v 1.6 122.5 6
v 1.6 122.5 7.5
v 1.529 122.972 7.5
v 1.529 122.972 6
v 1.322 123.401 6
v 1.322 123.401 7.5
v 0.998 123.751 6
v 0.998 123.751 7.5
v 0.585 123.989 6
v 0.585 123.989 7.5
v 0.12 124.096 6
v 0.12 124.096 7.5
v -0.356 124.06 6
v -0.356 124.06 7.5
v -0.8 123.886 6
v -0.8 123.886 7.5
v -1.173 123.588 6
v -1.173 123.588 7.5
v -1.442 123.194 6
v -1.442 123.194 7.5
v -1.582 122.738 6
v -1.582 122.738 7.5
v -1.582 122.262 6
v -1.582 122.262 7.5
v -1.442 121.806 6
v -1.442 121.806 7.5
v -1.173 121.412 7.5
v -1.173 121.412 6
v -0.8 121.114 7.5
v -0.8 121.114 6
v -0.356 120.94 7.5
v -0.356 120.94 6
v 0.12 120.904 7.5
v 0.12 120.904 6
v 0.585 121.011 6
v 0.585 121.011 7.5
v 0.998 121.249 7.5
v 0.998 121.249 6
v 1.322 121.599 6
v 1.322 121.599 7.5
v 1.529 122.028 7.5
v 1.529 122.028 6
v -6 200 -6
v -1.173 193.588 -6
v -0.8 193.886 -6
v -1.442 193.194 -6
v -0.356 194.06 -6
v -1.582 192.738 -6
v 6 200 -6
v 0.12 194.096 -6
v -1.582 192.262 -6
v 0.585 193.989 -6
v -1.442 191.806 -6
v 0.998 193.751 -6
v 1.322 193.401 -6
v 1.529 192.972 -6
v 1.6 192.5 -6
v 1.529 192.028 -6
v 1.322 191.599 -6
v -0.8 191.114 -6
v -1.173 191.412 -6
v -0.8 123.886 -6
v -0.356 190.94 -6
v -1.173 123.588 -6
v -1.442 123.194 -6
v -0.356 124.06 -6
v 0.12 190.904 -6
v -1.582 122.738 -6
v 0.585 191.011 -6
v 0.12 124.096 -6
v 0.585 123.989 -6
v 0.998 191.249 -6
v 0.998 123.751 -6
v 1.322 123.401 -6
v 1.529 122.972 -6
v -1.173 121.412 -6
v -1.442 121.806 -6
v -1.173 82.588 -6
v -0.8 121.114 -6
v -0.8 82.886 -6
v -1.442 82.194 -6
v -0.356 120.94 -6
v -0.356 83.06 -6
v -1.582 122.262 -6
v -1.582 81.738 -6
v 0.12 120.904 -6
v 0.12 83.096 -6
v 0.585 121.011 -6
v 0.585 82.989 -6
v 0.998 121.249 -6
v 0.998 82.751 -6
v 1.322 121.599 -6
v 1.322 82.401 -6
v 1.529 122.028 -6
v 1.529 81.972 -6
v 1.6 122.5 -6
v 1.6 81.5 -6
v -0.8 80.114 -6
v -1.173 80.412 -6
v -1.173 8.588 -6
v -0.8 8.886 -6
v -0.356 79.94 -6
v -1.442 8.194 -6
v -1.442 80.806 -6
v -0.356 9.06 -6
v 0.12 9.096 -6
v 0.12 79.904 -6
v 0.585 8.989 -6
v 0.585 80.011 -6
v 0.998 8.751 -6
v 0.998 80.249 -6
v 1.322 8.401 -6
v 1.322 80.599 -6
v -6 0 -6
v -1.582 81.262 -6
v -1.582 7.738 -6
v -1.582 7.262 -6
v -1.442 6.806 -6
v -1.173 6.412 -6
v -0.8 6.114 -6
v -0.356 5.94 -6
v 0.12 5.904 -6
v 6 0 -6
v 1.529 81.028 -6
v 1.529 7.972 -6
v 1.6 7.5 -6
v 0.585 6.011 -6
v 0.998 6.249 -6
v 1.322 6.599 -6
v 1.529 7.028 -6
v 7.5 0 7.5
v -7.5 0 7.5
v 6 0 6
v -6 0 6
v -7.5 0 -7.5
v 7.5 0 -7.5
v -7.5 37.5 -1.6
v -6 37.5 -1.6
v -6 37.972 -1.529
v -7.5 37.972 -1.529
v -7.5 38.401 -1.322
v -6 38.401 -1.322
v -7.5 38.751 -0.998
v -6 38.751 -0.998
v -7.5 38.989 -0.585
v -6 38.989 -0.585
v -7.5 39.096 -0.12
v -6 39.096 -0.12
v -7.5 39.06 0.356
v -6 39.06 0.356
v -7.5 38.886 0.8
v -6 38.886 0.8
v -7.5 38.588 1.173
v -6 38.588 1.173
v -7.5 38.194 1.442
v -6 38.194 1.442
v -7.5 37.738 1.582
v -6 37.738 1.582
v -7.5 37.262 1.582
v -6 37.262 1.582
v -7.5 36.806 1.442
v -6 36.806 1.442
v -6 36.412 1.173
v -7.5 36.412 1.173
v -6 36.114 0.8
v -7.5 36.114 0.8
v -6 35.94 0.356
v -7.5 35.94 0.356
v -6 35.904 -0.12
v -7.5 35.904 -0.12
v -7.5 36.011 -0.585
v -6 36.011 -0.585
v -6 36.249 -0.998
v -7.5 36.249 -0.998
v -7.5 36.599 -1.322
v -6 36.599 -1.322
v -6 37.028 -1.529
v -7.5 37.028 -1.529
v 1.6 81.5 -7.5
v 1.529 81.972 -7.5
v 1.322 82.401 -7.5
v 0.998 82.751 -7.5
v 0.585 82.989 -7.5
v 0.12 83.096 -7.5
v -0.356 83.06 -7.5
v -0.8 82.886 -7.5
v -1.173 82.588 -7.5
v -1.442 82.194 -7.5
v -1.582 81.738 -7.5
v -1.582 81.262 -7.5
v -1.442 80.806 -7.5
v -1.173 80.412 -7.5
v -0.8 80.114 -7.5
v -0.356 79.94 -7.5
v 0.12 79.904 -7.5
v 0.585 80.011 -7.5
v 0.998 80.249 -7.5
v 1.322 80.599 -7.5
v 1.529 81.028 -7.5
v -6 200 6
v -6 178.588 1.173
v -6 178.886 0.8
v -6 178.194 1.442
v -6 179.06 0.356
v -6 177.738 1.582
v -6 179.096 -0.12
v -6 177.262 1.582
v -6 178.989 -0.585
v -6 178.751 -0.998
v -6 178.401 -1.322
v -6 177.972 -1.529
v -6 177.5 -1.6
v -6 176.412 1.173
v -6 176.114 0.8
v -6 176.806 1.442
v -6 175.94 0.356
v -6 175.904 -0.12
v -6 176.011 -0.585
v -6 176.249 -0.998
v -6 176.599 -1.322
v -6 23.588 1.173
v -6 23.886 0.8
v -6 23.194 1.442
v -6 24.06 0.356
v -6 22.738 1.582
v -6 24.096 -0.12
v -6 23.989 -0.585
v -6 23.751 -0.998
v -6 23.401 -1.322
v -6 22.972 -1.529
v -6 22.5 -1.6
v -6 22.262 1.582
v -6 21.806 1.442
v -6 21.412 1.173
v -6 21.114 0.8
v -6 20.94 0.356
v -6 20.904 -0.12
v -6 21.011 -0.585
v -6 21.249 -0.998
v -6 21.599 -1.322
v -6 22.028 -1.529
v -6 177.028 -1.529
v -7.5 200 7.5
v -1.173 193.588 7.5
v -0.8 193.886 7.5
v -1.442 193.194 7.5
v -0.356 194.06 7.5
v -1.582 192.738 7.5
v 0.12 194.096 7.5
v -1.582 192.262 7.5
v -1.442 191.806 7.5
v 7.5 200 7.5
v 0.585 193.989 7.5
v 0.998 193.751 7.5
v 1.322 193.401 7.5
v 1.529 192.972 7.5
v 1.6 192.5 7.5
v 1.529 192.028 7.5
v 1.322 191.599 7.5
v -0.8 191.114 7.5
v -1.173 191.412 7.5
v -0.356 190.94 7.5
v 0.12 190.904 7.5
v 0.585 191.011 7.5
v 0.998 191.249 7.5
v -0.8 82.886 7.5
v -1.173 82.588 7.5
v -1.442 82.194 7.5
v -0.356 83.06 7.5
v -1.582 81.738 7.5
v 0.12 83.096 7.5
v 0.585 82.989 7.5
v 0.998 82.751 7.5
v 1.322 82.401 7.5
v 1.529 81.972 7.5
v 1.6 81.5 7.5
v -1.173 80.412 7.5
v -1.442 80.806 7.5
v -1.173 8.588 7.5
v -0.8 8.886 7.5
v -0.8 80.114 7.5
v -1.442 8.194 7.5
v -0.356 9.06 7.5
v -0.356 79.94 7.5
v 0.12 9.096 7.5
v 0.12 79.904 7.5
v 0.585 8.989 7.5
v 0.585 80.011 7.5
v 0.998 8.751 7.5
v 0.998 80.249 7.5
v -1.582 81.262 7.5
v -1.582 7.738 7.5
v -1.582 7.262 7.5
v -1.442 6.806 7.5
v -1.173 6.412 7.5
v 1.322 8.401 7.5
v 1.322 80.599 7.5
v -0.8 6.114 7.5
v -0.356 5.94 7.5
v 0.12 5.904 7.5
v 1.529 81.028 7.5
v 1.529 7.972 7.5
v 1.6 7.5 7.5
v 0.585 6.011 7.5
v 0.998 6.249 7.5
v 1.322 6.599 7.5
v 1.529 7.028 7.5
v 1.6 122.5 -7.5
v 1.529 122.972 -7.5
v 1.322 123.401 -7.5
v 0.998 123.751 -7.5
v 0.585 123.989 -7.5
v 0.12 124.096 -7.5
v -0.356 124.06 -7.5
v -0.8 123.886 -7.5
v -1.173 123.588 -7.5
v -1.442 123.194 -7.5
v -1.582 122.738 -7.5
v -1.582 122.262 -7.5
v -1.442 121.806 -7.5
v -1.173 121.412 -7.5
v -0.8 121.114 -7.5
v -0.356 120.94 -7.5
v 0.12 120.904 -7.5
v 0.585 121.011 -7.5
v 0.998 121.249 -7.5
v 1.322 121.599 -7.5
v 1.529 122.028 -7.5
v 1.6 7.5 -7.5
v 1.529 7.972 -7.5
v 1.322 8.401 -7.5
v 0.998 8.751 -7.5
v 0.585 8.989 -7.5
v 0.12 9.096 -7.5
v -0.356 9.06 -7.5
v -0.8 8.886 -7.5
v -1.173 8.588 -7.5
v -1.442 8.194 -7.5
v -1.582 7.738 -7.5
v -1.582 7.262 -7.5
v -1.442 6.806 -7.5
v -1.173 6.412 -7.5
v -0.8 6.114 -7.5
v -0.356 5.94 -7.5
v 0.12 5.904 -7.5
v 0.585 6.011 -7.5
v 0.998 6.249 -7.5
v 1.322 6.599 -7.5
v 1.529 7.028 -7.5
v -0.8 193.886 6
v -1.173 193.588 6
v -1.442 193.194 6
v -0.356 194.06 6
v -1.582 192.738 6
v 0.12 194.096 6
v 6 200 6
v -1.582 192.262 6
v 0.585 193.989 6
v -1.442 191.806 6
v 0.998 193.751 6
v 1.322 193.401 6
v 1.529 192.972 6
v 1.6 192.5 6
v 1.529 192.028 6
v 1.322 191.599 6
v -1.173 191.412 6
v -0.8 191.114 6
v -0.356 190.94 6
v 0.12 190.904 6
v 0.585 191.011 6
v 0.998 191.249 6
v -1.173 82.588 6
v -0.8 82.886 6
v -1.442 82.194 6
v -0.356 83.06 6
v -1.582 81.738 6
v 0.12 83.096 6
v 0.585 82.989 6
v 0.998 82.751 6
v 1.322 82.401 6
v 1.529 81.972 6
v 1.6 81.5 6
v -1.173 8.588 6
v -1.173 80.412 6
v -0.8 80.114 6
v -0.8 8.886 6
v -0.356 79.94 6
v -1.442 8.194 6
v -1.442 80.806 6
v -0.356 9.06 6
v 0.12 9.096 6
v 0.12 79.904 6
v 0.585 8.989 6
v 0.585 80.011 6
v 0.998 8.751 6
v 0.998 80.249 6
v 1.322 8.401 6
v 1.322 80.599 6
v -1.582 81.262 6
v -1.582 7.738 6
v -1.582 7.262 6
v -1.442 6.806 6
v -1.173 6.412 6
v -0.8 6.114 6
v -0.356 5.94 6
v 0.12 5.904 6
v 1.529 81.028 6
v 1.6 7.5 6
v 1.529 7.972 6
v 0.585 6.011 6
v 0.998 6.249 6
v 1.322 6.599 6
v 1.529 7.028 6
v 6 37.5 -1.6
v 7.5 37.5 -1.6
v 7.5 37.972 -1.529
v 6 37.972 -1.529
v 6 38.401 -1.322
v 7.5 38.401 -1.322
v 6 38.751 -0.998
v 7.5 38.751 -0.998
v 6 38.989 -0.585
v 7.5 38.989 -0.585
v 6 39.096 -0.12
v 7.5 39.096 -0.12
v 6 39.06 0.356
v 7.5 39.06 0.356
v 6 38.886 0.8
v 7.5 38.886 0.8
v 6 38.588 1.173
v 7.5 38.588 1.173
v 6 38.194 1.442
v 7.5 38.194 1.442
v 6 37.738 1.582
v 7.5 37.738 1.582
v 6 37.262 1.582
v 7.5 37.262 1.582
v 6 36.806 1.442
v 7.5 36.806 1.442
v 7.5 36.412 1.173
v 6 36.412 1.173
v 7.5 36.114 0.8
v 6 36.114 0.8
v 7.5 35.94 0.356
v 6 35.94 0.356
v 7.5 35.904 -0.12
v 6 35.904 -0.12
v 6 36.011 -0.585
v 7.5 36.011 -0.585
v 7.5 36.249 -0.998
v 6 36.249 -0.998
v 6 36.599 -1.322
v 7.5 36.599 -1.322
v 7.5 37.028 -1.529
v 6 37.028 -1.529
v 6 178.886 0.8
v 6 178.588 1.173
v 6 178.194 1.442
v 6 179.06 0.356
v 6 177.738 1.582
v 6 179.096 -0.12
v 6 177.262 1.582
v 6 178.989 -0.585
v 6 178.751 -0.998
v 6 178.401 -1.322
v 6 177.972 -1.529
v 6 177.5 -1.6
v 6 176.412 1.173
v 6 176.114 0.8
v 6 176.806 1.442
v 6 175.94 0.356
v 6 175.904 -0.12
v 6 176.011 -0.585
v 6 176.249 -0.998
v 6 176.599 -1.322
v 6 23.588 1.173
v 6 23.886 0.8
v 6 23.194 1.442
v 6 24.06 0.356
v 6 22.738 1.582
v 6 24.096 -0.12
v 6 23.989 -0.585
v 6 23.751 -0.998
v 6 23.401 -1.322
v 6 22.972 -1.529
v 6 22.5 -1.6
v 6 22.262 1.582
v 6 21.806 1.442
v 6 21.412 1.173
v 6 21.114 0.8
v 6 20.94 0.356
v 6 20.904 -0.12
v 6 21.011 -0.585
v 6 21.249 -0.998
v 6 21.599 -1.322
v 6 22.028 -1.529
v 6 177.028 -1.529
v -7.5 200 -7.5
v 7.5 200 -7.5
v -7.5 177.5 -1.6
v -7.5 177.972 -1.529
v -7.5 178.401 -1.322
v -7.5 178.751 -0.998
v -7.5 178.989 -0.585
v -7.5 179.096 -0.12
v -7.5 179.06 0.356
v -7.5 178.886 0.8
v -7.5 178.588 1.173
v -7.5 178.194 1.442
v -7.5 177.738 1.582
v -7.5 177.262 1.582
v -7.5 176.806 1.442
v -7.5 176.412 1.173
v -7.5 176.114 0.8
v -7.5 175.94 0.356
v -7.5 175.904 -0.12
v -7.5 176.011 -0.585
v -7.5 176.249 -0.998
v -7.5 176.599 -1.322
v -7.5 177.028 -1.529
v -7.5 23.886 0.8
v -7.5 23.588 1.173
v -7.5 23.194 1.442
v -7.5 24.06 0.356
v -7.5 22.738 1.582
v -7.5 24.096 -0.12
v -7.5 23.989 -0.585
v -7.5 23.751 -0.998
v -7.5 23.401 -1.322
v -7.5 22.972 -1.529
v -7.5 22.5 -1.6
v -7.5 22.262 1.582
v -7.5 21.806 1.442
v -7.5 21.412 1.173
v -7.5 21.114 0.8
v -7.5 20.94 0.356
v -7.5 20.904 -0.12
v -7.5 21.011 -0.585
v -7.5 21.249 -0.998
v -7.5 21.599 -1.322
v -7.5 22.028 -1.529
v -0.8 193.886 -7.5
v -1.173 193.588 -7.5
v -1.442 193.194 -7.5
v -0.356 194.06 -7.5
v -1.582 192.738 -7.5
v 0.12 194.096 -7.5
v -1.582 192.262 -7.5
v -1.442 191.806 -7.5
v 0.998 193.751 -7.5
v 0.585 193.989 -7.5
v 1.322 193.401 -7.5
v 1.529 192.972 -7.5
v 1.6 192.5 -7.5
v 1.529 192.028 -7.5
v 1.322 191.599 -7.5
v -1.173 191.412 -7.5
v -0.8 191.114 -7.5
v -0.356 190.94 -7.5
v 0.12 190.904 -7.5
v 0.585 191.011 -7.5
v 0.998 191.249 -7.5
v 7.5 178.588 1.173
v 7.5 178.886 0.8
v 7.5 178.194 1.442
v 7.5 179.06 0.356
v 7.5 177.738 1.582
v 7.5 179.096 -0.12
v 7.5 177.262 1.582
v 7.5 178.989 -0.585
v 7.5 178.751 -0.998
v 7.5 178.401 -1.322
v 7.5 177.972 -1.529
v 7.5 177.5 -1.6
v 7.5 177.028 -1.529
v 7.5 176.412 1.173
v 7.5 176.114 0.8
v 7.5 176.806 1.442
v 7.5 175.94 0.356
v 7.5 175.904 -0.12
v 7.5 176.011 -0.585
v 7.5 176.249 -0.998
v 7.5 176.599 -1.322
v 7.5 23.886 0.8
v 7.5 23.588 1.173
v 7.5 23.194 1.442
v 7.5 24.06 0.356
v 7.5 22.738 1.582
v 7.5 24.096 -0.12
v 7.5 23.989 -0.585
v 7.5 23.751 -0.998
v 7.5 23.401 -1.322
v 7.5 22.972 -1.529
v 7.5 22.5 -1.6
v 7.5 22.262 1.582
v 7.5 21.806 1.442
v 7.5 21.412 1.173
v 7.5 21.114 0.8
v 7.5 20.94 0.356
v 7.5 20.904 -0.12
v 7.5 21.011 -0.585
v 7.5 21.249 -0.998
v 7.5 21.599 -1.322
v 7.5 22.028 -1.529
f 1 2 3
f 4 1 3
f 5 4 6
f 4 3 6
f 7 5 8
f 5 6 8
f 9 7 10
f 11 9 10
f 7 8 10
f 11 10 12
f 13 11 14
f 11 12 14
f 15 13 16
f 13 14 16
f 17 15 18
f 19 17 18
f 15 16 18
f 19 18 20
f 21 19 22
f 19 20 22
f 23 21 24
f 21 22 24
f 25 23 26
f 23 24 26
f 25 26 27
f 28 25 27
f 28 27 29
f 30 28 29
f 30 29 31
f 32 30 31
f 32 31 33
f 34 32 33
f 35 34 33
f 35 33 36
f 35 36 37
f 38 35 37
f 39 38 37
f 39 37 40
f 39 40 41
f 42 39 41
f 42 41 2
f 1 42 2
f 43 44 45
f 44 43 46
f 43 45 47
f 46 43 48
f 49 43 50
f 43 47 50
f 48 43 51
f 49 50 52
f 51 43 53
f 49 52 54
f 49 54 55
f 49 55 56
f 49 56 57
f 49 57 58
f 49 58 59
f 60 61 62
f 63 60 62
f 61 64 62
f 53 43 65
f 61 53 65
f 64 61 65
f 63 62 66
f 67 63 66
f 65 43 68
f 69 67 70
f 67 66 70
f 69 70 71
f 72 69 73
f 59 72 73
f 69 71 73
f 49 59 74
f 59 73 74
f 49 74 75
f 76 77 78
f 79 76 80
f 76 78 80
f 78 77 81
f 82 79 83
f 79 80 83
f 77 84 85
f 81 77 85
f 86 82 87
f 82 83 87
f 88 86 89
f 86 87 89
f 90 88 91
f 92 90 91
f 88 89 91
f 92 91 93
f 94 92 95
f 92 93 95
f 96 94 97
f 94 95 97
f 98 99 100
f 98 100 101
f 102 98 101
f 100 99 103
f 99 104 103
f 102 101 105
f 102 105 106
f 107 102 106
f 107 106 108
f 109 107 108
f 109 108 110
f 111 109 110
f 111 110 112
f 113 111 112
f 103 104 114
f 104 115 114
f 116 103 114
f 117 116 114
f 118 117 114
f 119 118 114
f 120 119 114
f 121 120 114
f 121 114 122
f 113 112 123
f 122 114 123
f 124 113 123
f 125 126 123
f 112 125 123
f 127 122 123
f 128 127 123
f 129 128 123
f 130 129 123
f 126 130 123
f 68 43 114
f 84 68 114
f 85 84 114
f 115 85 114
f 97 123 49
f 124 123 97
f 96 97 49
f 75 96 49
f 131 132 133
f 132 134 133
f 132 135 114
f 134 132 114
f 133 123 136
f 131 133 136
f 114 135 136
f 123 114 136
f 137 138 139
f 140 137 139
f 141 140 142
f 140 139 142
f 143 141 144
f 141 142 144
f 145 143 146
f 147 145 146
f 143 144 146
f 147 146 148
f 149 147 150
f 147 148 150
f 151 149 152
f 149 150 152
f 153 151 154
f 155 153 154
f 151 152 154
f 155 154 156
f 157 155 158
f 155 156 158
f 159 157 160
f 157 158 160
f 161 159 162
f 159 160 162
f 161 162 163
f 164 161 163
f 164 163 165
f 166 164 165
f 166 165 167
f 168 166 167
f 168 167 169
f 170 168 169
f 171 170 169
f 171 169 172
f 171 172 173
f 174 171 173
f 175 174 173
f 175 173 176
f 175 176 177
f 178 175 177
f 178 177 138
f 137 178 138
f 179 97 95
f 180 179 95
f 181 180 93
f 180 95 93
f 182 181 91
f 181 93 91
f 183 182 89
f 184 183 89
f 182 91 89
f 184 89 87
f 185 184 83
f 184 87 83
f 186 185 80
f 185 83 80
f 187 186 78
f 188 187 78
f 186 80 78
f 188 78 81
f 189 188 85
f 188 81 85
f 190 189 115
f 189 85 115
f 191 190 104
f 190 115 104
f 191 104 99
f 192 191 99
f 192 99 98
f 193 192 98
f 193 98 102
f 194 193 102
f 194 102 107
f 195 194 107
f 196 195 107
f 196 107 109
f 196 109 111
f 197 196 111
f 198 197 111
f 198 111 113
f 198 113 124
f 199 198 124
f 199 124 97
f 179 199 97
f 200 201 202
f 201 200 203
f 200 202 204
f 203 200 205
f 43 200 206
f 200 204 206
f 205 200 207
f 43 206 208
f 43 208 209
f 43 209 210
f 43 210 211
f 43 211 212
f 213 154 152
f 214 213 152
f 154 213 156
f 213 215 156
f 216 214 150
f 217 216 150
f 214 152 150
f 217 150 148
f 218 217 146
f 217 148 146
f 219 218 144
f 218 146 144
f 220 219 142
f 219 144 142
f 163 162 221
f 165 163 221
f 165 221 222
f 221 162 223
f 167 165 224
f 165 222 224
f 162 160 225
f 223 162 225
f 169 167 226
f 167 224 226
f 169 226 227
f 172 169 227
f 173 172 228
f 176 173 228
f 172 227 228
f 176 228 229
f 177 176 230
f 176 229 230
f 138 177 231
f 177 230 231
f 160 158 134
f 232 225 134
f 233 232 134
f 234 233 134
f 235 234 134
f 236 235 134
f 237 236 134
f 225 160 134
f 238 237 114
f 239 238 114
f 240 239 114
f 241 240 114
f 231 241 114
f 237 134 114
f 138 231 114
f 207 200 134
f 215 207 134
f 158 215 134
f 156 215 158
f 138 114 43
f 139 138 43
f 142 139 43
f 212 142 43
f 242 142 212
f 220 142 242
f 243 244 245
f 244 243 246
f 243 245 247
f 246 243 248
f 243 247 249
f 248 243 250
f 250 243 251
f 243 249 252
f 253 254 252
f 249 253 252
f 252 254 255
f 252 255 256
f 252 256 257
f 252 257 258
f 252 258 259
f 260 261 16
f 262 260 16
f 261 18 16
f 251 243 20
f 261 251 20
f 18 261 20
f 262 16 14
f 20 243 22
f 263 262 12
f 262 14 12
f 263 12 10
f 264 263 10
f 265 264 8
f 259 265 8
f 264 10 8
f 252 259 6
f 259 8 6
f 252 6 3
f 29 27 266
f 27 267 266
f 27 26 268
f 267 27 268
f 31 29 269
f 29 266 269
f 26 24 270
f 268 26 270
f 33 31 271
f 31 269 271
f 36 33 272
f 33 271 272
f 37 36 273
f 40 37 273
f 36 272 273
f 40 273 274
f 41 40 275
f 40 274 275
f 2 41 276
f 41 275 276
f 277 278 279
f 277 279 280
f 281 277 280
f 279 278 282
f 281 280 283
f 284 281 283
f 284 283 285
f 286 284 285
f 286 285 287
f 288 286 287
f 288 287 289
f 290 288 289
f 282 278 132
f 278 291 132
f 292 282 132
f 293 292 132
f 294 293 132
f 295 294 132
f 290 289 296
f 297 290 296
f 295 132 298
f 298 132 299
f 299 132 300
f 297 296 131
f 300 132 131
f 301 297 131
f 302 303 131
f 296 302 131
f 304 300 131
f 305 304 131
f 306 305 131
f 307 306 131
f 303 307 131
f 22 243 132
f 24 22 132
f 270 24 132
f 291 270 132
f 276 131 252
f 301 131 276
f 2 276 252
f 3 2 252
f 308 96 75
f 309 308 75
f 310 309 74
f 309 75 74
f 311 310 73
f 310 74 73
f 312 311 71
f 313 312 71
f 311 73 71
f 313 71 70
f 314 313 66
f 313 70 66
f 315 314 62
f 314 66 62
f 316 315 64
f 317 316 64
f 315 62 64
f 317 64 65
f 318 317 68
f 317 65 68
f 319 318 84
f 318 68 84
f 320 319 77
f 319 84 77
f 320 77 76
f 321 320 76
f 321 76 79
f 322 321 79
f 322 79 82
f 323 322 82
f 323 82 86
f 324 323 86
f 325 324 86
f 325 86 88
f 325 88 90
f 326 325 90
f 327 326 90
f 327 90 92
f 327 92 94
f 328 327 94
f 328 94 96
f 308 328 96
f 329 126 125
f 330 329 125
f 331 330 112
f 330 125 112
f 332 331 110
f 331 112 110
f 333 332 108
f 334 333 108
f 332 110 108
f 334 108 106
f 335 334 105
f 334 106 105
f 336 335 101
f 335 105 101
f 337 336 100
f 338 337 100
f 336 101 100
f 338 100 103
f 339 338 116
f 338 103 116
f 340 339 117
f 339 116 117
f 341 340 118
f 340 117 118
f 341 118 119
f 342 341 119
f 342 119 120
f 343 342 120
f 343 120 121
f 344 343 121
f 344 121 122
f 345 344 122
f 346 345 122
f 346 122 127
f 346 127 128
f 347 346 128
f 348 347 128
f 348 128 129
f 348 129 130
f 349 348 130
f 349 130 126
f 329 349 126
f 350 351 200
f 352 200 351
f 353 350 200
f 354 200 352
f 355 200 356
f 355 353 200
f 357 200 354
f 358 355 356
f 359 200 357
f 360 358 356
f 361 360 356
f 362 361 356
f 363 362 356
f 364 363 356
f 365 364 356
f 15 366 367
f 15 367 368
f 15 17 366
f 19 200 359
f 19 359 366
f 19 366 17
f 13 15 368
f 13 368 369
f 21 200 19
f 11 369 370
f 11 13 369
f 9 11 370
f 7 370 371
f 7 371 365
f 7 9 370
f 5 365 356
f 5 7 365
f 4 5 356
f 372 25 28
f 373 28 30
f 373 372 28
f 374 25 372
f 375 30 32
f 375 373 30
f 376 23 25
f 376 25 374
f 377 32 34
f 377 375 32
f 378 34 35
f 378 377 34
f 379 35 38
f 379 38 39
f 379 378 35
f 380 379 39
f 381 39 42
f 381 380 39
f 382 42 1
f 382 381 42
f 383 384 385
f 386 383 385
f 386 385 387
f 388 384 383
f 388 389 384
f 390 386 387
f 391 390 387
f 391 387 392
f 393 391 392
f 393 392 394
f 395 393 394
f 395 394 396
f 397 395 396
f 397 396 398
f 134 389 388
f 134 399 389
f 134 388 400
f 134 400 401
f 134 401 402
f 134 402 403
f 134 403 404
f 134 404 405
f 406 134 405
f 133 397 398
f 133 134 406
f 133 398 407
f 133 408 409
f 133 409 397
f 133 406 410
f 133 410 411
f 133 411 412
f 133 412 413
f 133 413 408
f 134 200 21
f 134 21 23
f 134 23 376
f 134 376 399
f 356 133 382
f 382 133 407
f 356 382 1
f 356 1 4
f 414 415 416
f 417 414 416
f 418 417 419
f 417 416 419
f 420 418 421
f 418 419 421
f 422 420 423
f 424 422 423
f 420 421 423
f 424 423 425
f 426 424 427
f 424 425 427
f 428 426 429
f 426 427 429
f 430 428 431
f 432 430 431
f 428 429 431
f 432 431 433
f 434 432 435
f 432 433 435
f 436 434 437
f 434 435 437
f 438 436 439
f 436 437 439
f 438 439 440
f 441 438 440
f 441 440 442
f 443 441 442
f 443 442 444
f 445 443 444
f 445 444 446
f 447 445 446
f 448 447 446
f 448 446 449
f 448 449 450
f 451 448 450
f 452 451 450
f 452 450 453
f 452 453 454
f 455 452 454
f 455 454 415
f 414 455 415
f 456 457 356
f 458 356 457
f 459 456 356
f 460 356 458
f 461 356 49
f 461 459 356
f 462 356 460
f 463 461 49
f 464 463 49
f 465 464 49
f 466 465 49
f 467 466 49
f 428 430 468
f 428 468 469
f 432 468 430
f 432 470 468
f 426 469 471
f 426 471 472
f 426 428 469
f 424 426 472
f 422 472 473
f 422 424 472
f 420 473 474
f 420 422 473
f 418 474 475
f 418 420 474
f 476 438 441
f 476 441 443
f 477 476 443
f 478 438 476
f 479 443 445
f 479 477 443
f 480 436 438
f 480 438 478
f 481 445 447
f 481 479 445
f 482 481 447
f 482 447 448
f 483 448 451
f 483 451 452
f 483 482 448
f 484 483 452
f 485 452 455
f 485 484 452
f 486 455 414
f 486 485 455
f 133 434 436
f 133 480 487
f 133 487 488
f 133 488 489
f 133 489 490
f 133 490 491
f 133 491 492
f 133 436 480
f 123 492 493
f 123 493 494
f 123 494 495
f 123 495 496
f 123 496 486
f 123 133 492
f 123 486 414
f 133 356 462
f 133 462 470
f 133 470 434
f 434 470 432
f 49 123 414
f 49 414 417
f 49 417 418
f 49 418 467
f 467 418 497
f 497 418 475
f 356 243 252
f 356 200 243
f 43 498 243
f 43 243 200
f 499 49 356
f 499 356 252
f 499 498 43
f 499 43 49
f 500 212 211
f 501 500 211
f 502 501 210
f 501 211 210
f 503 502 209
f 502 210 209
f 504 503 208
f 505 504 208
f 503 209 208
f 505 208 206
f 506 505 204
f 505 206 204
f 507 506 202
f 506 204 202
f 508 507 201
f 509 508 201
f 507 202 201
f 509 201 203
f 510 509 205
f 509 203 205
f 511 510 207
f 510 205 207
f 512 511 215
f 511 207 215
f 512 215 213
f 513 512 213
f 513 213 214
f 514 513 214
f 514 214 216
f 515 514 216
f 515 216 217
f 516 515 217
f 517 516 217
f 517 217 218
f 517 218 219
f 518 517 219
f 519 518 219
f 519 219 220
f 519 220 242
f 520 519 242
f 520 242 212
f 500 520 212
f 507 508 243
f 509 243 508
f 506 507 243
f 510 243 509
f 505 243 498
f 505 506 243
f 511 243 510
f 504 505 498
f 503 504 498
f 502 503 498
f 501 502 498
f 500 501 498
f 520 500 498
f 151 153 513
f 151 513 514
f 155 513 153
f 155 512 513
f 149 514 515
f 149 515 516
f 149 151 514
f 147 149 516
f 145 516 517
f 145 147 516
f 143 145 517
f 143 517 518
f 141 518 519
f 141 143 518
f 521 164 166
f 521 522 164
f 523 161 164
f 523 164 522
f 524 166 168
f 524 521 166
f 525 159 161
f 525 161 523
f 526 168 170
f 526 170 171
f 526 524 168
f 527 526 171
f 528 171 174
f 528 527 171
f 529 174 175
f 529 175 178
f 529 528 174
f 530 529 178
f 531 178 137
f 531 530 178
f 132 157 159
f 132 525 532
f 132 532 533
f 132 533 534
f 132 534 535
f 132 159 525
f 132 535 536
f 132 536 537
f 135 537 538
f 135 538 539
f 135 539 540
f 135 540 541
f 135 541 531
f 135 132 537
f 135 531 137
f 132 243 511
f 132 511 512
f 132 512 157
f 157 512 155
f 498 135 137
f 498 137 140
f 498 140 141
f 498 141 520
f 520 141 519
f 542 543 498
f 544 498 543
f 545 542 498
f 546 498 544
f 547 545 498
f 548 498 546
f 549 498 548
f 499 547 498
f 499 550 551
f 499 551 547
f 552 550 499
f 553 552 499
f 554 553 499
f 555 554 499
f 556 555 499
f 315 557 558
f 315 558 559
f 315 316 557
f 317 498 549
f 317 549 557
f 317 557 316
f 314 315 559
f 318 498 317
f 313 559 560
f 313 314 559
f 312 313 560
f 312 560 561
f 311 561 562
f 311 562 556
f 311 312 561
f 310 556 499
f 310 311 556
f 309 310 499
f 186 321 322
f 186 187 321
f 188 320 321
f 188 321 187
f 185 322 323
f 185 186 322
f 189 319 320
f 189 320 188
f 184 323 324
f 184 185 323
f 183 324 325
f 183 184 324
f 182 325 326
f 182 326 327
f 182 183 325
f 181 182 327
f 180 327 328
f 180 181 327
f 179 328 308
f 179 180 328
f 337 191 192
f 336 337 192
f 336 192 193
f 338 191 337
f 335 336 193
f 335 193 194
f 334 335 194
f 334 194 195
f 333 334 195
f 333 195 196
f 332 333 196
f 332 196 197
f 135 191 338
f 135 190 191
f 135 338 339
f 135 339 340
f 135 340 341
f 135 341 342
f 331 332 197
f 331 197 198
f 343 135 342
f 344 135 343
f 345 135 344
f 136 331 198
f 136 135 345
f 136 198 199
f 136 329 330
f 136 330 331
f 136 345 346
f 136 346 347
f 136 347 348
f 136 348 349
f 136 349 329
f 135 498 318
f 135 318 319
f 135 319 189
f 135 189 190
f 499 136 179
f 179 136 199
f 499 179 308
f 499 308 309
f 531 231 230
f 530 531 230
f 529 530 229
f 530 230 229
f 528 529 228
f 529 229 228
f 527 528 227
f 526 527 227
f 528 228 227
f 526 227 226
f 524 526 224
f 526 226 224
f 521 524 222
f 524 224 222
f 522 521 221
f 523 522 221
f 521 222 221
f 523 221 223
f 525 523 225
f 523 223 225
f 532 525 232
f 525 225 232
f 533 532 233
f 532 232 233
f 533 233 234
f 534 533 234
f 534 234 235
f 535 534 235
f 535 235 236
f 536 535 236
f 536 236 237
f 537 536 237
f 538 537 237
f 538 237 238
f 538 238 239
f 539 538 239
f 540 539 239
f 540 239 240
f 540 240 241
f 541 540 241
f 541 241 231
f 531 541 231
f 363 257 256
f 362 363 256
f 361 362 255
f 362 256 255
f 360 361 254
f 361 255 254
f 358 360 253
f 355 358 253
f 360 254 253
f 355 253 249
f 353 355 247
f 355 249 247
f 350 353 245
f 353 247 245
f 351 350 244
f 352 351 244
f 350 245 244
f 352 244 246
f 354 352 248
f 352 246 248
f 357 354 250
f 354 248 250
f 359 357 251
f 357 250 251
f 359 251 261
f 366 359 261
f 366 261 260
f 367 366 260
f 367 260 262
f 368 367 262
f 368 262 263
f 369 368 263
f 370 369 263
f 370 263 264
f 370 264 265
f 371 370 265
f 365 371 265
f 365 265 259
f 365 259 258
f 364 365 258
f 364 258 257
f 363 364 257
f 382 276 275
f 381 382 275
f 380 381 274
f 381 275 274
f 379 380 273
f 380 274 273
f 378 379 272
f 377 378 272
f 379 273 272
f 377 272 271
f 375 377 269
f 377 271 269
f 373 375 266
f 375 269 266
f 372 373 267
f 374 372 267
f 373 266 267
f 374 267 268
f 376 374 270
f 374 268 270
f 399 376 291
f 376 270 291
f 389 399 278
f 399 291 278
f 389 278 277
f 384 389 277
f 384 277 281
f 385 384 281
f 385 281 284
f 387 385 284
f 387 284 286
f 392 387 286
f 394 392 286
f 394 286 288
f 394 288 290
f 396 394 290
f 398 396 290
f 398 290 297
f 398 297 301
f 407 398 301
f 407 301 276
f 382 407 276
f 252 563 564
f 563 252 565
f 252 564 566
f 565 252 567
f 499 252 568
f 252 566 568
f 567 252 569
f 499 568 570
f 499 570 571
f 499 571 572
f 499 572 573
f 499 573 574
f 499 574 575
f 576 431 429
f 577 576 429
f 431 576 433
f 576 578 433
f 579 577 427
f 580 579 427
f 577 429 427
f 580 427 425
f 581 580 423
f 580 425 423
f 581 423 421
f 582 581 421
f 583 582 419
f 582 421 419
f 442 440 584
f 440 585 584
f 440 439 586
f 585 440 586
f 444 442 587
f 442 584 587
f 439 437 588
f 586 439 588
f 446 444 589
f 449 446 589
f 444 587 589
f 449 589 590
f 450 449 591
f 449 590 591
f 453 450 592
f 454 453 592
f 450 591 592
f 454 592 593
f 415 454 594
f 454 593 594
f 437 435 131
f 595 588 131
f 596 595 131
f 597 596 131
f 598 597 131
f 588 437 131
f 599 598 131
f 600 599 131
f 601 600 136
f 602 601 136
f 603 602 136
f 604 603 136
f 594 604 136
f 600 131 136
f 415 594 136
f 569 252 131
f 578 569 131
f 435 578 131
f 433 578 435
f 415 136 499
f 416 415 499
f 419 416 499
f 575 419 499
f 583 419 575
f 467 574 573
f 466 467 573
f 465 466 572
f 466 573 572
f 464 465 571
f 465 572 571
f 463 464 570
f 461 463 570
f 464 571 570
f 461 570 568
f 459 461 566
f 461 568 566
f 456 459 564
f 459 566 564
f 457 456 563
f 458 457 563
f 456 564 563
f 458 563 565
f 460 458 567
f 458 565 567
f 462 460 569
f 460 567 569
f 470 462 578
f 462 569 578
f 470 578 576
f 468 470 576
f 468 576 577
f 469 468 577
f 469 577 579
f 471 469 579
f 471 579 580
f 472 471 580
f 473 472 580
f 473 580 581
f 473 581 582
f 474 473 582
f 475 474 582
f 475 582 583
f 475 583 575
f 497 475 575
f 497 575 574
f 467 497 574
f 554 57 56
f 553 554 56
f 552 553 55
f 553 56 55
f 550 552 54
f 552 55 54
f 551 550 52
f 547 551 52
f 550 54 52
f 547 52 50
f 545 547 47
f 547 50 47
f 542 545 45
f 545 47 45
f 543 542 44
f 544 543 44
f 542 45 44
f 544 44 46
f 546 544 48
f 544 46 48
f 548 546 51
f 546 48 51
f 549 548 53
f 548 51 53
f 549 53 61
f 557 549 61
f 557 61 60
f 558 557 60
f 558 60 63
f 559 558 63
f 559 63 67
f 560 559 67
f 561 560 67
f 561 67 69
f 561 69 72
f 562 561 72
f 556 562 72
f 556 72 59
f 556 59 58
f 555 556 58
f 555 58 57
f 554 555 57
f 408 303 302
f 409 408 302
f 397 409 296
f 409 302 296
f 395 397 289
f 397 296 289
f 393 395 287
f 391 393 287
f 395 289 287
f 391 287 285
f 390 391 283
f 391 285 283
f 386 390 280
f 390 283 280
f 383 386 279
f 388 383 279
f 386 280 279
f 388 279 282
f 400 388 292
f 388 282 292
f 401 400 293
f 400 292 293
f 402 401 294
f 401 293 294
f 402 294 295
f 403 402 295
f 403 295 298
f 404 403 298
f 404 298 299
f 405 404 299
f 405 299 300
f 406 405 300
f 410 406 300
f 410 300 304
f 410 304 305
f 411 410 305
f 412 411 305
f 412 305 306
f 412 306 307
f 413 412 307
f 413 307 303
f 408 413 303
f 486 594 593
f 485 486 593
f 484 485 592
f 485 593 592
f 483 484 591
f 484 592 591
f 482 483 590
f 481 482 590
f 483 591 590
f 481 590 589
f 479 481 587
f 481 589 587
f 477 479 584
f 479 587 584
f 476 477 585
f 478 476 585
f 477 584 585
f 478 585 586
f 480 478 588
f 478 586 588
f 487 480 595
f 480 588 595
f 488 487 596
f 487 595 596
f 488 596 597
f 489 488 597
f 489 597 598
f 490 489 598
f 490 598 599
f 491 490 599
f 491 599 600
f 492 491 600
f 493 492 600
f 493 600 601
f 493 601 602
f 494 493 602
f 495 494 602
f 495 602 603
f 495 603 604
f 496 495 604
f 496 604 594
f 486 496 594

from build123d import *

# Parameters (mm, degrees)
SKETCH_1_W          = 15
SKETCH_1_H          = 15
SKETCH_1_W_2        = 12
SKETCH_1_H_2        = 12
EXTRUDE_1_DEPTH     = 200
SKETCH_2_R          = 1.6
CUT_EXTRUDE_1_DEPTH = 201.701893364
SKETCH_3_R          = 1.6
CUT_EXTRUDE_2_DEPTH = 201.701893364


with BuildPart() as part:
    # ｽｹｯﾁ1 → ﾎﾞｽ - 押し出し1 (new body)
    with BuildSketch(Plane(origin=(0, 0, 0), x_dir=(1, 0, 0), z_dir=(0, 1, 0))):
        Rectangle(SKETCH_1_W, SKETCH_1_H)
        Rectangle(SKETCH_1_W_2, SKETCH_1_H_2, mode=Mode.SUBTRACT)
    extrude(amount=EXTRUDE_1_DEPTH)

    # ｽｹｯﾁ2 → ｶｯﾄ - 押し出し1 (cut, through all)
    with BuildSketch(Plane.XY.offset(7.5)):
        with Locations((0, 192.5)):
            Circle(SKETCH_2_R)
        with Locations((0, 7.5)):
            Circle(SKETCH_2_R)
        with Locations((0, 122.5)):
            Circle(SKETCH_2_R)
        with Locations((0, 81.5)):
            Circle(SKETCH_2_R)
    extrude(amount=-CUT_EXTRUDE_1_DEPTH, mode=Mode.SUBTRACT)

    # ｽｹｯﾁ3 → ｶｯﾄ - 押し出し2 (cut, through all)
    with BuildSketch(Plane(origin=(7.5, 0, 0), x_dir=(0, 0, -1), z_dir=(1, 0, 0))):
        with Locations((0, 177.5)):
            Circle(SKETCH_3_R)
        with Locations((0, 22.5)):
            Circle(SKETCH_3_R)
        with Locations((0, 37.5)):
            Circle(SKETCH_3_R)
    extrude(amount=-CUT_EXTRUDE_2_DEPTH, mode=Mode.SUBTRACT)


solid = part.part
